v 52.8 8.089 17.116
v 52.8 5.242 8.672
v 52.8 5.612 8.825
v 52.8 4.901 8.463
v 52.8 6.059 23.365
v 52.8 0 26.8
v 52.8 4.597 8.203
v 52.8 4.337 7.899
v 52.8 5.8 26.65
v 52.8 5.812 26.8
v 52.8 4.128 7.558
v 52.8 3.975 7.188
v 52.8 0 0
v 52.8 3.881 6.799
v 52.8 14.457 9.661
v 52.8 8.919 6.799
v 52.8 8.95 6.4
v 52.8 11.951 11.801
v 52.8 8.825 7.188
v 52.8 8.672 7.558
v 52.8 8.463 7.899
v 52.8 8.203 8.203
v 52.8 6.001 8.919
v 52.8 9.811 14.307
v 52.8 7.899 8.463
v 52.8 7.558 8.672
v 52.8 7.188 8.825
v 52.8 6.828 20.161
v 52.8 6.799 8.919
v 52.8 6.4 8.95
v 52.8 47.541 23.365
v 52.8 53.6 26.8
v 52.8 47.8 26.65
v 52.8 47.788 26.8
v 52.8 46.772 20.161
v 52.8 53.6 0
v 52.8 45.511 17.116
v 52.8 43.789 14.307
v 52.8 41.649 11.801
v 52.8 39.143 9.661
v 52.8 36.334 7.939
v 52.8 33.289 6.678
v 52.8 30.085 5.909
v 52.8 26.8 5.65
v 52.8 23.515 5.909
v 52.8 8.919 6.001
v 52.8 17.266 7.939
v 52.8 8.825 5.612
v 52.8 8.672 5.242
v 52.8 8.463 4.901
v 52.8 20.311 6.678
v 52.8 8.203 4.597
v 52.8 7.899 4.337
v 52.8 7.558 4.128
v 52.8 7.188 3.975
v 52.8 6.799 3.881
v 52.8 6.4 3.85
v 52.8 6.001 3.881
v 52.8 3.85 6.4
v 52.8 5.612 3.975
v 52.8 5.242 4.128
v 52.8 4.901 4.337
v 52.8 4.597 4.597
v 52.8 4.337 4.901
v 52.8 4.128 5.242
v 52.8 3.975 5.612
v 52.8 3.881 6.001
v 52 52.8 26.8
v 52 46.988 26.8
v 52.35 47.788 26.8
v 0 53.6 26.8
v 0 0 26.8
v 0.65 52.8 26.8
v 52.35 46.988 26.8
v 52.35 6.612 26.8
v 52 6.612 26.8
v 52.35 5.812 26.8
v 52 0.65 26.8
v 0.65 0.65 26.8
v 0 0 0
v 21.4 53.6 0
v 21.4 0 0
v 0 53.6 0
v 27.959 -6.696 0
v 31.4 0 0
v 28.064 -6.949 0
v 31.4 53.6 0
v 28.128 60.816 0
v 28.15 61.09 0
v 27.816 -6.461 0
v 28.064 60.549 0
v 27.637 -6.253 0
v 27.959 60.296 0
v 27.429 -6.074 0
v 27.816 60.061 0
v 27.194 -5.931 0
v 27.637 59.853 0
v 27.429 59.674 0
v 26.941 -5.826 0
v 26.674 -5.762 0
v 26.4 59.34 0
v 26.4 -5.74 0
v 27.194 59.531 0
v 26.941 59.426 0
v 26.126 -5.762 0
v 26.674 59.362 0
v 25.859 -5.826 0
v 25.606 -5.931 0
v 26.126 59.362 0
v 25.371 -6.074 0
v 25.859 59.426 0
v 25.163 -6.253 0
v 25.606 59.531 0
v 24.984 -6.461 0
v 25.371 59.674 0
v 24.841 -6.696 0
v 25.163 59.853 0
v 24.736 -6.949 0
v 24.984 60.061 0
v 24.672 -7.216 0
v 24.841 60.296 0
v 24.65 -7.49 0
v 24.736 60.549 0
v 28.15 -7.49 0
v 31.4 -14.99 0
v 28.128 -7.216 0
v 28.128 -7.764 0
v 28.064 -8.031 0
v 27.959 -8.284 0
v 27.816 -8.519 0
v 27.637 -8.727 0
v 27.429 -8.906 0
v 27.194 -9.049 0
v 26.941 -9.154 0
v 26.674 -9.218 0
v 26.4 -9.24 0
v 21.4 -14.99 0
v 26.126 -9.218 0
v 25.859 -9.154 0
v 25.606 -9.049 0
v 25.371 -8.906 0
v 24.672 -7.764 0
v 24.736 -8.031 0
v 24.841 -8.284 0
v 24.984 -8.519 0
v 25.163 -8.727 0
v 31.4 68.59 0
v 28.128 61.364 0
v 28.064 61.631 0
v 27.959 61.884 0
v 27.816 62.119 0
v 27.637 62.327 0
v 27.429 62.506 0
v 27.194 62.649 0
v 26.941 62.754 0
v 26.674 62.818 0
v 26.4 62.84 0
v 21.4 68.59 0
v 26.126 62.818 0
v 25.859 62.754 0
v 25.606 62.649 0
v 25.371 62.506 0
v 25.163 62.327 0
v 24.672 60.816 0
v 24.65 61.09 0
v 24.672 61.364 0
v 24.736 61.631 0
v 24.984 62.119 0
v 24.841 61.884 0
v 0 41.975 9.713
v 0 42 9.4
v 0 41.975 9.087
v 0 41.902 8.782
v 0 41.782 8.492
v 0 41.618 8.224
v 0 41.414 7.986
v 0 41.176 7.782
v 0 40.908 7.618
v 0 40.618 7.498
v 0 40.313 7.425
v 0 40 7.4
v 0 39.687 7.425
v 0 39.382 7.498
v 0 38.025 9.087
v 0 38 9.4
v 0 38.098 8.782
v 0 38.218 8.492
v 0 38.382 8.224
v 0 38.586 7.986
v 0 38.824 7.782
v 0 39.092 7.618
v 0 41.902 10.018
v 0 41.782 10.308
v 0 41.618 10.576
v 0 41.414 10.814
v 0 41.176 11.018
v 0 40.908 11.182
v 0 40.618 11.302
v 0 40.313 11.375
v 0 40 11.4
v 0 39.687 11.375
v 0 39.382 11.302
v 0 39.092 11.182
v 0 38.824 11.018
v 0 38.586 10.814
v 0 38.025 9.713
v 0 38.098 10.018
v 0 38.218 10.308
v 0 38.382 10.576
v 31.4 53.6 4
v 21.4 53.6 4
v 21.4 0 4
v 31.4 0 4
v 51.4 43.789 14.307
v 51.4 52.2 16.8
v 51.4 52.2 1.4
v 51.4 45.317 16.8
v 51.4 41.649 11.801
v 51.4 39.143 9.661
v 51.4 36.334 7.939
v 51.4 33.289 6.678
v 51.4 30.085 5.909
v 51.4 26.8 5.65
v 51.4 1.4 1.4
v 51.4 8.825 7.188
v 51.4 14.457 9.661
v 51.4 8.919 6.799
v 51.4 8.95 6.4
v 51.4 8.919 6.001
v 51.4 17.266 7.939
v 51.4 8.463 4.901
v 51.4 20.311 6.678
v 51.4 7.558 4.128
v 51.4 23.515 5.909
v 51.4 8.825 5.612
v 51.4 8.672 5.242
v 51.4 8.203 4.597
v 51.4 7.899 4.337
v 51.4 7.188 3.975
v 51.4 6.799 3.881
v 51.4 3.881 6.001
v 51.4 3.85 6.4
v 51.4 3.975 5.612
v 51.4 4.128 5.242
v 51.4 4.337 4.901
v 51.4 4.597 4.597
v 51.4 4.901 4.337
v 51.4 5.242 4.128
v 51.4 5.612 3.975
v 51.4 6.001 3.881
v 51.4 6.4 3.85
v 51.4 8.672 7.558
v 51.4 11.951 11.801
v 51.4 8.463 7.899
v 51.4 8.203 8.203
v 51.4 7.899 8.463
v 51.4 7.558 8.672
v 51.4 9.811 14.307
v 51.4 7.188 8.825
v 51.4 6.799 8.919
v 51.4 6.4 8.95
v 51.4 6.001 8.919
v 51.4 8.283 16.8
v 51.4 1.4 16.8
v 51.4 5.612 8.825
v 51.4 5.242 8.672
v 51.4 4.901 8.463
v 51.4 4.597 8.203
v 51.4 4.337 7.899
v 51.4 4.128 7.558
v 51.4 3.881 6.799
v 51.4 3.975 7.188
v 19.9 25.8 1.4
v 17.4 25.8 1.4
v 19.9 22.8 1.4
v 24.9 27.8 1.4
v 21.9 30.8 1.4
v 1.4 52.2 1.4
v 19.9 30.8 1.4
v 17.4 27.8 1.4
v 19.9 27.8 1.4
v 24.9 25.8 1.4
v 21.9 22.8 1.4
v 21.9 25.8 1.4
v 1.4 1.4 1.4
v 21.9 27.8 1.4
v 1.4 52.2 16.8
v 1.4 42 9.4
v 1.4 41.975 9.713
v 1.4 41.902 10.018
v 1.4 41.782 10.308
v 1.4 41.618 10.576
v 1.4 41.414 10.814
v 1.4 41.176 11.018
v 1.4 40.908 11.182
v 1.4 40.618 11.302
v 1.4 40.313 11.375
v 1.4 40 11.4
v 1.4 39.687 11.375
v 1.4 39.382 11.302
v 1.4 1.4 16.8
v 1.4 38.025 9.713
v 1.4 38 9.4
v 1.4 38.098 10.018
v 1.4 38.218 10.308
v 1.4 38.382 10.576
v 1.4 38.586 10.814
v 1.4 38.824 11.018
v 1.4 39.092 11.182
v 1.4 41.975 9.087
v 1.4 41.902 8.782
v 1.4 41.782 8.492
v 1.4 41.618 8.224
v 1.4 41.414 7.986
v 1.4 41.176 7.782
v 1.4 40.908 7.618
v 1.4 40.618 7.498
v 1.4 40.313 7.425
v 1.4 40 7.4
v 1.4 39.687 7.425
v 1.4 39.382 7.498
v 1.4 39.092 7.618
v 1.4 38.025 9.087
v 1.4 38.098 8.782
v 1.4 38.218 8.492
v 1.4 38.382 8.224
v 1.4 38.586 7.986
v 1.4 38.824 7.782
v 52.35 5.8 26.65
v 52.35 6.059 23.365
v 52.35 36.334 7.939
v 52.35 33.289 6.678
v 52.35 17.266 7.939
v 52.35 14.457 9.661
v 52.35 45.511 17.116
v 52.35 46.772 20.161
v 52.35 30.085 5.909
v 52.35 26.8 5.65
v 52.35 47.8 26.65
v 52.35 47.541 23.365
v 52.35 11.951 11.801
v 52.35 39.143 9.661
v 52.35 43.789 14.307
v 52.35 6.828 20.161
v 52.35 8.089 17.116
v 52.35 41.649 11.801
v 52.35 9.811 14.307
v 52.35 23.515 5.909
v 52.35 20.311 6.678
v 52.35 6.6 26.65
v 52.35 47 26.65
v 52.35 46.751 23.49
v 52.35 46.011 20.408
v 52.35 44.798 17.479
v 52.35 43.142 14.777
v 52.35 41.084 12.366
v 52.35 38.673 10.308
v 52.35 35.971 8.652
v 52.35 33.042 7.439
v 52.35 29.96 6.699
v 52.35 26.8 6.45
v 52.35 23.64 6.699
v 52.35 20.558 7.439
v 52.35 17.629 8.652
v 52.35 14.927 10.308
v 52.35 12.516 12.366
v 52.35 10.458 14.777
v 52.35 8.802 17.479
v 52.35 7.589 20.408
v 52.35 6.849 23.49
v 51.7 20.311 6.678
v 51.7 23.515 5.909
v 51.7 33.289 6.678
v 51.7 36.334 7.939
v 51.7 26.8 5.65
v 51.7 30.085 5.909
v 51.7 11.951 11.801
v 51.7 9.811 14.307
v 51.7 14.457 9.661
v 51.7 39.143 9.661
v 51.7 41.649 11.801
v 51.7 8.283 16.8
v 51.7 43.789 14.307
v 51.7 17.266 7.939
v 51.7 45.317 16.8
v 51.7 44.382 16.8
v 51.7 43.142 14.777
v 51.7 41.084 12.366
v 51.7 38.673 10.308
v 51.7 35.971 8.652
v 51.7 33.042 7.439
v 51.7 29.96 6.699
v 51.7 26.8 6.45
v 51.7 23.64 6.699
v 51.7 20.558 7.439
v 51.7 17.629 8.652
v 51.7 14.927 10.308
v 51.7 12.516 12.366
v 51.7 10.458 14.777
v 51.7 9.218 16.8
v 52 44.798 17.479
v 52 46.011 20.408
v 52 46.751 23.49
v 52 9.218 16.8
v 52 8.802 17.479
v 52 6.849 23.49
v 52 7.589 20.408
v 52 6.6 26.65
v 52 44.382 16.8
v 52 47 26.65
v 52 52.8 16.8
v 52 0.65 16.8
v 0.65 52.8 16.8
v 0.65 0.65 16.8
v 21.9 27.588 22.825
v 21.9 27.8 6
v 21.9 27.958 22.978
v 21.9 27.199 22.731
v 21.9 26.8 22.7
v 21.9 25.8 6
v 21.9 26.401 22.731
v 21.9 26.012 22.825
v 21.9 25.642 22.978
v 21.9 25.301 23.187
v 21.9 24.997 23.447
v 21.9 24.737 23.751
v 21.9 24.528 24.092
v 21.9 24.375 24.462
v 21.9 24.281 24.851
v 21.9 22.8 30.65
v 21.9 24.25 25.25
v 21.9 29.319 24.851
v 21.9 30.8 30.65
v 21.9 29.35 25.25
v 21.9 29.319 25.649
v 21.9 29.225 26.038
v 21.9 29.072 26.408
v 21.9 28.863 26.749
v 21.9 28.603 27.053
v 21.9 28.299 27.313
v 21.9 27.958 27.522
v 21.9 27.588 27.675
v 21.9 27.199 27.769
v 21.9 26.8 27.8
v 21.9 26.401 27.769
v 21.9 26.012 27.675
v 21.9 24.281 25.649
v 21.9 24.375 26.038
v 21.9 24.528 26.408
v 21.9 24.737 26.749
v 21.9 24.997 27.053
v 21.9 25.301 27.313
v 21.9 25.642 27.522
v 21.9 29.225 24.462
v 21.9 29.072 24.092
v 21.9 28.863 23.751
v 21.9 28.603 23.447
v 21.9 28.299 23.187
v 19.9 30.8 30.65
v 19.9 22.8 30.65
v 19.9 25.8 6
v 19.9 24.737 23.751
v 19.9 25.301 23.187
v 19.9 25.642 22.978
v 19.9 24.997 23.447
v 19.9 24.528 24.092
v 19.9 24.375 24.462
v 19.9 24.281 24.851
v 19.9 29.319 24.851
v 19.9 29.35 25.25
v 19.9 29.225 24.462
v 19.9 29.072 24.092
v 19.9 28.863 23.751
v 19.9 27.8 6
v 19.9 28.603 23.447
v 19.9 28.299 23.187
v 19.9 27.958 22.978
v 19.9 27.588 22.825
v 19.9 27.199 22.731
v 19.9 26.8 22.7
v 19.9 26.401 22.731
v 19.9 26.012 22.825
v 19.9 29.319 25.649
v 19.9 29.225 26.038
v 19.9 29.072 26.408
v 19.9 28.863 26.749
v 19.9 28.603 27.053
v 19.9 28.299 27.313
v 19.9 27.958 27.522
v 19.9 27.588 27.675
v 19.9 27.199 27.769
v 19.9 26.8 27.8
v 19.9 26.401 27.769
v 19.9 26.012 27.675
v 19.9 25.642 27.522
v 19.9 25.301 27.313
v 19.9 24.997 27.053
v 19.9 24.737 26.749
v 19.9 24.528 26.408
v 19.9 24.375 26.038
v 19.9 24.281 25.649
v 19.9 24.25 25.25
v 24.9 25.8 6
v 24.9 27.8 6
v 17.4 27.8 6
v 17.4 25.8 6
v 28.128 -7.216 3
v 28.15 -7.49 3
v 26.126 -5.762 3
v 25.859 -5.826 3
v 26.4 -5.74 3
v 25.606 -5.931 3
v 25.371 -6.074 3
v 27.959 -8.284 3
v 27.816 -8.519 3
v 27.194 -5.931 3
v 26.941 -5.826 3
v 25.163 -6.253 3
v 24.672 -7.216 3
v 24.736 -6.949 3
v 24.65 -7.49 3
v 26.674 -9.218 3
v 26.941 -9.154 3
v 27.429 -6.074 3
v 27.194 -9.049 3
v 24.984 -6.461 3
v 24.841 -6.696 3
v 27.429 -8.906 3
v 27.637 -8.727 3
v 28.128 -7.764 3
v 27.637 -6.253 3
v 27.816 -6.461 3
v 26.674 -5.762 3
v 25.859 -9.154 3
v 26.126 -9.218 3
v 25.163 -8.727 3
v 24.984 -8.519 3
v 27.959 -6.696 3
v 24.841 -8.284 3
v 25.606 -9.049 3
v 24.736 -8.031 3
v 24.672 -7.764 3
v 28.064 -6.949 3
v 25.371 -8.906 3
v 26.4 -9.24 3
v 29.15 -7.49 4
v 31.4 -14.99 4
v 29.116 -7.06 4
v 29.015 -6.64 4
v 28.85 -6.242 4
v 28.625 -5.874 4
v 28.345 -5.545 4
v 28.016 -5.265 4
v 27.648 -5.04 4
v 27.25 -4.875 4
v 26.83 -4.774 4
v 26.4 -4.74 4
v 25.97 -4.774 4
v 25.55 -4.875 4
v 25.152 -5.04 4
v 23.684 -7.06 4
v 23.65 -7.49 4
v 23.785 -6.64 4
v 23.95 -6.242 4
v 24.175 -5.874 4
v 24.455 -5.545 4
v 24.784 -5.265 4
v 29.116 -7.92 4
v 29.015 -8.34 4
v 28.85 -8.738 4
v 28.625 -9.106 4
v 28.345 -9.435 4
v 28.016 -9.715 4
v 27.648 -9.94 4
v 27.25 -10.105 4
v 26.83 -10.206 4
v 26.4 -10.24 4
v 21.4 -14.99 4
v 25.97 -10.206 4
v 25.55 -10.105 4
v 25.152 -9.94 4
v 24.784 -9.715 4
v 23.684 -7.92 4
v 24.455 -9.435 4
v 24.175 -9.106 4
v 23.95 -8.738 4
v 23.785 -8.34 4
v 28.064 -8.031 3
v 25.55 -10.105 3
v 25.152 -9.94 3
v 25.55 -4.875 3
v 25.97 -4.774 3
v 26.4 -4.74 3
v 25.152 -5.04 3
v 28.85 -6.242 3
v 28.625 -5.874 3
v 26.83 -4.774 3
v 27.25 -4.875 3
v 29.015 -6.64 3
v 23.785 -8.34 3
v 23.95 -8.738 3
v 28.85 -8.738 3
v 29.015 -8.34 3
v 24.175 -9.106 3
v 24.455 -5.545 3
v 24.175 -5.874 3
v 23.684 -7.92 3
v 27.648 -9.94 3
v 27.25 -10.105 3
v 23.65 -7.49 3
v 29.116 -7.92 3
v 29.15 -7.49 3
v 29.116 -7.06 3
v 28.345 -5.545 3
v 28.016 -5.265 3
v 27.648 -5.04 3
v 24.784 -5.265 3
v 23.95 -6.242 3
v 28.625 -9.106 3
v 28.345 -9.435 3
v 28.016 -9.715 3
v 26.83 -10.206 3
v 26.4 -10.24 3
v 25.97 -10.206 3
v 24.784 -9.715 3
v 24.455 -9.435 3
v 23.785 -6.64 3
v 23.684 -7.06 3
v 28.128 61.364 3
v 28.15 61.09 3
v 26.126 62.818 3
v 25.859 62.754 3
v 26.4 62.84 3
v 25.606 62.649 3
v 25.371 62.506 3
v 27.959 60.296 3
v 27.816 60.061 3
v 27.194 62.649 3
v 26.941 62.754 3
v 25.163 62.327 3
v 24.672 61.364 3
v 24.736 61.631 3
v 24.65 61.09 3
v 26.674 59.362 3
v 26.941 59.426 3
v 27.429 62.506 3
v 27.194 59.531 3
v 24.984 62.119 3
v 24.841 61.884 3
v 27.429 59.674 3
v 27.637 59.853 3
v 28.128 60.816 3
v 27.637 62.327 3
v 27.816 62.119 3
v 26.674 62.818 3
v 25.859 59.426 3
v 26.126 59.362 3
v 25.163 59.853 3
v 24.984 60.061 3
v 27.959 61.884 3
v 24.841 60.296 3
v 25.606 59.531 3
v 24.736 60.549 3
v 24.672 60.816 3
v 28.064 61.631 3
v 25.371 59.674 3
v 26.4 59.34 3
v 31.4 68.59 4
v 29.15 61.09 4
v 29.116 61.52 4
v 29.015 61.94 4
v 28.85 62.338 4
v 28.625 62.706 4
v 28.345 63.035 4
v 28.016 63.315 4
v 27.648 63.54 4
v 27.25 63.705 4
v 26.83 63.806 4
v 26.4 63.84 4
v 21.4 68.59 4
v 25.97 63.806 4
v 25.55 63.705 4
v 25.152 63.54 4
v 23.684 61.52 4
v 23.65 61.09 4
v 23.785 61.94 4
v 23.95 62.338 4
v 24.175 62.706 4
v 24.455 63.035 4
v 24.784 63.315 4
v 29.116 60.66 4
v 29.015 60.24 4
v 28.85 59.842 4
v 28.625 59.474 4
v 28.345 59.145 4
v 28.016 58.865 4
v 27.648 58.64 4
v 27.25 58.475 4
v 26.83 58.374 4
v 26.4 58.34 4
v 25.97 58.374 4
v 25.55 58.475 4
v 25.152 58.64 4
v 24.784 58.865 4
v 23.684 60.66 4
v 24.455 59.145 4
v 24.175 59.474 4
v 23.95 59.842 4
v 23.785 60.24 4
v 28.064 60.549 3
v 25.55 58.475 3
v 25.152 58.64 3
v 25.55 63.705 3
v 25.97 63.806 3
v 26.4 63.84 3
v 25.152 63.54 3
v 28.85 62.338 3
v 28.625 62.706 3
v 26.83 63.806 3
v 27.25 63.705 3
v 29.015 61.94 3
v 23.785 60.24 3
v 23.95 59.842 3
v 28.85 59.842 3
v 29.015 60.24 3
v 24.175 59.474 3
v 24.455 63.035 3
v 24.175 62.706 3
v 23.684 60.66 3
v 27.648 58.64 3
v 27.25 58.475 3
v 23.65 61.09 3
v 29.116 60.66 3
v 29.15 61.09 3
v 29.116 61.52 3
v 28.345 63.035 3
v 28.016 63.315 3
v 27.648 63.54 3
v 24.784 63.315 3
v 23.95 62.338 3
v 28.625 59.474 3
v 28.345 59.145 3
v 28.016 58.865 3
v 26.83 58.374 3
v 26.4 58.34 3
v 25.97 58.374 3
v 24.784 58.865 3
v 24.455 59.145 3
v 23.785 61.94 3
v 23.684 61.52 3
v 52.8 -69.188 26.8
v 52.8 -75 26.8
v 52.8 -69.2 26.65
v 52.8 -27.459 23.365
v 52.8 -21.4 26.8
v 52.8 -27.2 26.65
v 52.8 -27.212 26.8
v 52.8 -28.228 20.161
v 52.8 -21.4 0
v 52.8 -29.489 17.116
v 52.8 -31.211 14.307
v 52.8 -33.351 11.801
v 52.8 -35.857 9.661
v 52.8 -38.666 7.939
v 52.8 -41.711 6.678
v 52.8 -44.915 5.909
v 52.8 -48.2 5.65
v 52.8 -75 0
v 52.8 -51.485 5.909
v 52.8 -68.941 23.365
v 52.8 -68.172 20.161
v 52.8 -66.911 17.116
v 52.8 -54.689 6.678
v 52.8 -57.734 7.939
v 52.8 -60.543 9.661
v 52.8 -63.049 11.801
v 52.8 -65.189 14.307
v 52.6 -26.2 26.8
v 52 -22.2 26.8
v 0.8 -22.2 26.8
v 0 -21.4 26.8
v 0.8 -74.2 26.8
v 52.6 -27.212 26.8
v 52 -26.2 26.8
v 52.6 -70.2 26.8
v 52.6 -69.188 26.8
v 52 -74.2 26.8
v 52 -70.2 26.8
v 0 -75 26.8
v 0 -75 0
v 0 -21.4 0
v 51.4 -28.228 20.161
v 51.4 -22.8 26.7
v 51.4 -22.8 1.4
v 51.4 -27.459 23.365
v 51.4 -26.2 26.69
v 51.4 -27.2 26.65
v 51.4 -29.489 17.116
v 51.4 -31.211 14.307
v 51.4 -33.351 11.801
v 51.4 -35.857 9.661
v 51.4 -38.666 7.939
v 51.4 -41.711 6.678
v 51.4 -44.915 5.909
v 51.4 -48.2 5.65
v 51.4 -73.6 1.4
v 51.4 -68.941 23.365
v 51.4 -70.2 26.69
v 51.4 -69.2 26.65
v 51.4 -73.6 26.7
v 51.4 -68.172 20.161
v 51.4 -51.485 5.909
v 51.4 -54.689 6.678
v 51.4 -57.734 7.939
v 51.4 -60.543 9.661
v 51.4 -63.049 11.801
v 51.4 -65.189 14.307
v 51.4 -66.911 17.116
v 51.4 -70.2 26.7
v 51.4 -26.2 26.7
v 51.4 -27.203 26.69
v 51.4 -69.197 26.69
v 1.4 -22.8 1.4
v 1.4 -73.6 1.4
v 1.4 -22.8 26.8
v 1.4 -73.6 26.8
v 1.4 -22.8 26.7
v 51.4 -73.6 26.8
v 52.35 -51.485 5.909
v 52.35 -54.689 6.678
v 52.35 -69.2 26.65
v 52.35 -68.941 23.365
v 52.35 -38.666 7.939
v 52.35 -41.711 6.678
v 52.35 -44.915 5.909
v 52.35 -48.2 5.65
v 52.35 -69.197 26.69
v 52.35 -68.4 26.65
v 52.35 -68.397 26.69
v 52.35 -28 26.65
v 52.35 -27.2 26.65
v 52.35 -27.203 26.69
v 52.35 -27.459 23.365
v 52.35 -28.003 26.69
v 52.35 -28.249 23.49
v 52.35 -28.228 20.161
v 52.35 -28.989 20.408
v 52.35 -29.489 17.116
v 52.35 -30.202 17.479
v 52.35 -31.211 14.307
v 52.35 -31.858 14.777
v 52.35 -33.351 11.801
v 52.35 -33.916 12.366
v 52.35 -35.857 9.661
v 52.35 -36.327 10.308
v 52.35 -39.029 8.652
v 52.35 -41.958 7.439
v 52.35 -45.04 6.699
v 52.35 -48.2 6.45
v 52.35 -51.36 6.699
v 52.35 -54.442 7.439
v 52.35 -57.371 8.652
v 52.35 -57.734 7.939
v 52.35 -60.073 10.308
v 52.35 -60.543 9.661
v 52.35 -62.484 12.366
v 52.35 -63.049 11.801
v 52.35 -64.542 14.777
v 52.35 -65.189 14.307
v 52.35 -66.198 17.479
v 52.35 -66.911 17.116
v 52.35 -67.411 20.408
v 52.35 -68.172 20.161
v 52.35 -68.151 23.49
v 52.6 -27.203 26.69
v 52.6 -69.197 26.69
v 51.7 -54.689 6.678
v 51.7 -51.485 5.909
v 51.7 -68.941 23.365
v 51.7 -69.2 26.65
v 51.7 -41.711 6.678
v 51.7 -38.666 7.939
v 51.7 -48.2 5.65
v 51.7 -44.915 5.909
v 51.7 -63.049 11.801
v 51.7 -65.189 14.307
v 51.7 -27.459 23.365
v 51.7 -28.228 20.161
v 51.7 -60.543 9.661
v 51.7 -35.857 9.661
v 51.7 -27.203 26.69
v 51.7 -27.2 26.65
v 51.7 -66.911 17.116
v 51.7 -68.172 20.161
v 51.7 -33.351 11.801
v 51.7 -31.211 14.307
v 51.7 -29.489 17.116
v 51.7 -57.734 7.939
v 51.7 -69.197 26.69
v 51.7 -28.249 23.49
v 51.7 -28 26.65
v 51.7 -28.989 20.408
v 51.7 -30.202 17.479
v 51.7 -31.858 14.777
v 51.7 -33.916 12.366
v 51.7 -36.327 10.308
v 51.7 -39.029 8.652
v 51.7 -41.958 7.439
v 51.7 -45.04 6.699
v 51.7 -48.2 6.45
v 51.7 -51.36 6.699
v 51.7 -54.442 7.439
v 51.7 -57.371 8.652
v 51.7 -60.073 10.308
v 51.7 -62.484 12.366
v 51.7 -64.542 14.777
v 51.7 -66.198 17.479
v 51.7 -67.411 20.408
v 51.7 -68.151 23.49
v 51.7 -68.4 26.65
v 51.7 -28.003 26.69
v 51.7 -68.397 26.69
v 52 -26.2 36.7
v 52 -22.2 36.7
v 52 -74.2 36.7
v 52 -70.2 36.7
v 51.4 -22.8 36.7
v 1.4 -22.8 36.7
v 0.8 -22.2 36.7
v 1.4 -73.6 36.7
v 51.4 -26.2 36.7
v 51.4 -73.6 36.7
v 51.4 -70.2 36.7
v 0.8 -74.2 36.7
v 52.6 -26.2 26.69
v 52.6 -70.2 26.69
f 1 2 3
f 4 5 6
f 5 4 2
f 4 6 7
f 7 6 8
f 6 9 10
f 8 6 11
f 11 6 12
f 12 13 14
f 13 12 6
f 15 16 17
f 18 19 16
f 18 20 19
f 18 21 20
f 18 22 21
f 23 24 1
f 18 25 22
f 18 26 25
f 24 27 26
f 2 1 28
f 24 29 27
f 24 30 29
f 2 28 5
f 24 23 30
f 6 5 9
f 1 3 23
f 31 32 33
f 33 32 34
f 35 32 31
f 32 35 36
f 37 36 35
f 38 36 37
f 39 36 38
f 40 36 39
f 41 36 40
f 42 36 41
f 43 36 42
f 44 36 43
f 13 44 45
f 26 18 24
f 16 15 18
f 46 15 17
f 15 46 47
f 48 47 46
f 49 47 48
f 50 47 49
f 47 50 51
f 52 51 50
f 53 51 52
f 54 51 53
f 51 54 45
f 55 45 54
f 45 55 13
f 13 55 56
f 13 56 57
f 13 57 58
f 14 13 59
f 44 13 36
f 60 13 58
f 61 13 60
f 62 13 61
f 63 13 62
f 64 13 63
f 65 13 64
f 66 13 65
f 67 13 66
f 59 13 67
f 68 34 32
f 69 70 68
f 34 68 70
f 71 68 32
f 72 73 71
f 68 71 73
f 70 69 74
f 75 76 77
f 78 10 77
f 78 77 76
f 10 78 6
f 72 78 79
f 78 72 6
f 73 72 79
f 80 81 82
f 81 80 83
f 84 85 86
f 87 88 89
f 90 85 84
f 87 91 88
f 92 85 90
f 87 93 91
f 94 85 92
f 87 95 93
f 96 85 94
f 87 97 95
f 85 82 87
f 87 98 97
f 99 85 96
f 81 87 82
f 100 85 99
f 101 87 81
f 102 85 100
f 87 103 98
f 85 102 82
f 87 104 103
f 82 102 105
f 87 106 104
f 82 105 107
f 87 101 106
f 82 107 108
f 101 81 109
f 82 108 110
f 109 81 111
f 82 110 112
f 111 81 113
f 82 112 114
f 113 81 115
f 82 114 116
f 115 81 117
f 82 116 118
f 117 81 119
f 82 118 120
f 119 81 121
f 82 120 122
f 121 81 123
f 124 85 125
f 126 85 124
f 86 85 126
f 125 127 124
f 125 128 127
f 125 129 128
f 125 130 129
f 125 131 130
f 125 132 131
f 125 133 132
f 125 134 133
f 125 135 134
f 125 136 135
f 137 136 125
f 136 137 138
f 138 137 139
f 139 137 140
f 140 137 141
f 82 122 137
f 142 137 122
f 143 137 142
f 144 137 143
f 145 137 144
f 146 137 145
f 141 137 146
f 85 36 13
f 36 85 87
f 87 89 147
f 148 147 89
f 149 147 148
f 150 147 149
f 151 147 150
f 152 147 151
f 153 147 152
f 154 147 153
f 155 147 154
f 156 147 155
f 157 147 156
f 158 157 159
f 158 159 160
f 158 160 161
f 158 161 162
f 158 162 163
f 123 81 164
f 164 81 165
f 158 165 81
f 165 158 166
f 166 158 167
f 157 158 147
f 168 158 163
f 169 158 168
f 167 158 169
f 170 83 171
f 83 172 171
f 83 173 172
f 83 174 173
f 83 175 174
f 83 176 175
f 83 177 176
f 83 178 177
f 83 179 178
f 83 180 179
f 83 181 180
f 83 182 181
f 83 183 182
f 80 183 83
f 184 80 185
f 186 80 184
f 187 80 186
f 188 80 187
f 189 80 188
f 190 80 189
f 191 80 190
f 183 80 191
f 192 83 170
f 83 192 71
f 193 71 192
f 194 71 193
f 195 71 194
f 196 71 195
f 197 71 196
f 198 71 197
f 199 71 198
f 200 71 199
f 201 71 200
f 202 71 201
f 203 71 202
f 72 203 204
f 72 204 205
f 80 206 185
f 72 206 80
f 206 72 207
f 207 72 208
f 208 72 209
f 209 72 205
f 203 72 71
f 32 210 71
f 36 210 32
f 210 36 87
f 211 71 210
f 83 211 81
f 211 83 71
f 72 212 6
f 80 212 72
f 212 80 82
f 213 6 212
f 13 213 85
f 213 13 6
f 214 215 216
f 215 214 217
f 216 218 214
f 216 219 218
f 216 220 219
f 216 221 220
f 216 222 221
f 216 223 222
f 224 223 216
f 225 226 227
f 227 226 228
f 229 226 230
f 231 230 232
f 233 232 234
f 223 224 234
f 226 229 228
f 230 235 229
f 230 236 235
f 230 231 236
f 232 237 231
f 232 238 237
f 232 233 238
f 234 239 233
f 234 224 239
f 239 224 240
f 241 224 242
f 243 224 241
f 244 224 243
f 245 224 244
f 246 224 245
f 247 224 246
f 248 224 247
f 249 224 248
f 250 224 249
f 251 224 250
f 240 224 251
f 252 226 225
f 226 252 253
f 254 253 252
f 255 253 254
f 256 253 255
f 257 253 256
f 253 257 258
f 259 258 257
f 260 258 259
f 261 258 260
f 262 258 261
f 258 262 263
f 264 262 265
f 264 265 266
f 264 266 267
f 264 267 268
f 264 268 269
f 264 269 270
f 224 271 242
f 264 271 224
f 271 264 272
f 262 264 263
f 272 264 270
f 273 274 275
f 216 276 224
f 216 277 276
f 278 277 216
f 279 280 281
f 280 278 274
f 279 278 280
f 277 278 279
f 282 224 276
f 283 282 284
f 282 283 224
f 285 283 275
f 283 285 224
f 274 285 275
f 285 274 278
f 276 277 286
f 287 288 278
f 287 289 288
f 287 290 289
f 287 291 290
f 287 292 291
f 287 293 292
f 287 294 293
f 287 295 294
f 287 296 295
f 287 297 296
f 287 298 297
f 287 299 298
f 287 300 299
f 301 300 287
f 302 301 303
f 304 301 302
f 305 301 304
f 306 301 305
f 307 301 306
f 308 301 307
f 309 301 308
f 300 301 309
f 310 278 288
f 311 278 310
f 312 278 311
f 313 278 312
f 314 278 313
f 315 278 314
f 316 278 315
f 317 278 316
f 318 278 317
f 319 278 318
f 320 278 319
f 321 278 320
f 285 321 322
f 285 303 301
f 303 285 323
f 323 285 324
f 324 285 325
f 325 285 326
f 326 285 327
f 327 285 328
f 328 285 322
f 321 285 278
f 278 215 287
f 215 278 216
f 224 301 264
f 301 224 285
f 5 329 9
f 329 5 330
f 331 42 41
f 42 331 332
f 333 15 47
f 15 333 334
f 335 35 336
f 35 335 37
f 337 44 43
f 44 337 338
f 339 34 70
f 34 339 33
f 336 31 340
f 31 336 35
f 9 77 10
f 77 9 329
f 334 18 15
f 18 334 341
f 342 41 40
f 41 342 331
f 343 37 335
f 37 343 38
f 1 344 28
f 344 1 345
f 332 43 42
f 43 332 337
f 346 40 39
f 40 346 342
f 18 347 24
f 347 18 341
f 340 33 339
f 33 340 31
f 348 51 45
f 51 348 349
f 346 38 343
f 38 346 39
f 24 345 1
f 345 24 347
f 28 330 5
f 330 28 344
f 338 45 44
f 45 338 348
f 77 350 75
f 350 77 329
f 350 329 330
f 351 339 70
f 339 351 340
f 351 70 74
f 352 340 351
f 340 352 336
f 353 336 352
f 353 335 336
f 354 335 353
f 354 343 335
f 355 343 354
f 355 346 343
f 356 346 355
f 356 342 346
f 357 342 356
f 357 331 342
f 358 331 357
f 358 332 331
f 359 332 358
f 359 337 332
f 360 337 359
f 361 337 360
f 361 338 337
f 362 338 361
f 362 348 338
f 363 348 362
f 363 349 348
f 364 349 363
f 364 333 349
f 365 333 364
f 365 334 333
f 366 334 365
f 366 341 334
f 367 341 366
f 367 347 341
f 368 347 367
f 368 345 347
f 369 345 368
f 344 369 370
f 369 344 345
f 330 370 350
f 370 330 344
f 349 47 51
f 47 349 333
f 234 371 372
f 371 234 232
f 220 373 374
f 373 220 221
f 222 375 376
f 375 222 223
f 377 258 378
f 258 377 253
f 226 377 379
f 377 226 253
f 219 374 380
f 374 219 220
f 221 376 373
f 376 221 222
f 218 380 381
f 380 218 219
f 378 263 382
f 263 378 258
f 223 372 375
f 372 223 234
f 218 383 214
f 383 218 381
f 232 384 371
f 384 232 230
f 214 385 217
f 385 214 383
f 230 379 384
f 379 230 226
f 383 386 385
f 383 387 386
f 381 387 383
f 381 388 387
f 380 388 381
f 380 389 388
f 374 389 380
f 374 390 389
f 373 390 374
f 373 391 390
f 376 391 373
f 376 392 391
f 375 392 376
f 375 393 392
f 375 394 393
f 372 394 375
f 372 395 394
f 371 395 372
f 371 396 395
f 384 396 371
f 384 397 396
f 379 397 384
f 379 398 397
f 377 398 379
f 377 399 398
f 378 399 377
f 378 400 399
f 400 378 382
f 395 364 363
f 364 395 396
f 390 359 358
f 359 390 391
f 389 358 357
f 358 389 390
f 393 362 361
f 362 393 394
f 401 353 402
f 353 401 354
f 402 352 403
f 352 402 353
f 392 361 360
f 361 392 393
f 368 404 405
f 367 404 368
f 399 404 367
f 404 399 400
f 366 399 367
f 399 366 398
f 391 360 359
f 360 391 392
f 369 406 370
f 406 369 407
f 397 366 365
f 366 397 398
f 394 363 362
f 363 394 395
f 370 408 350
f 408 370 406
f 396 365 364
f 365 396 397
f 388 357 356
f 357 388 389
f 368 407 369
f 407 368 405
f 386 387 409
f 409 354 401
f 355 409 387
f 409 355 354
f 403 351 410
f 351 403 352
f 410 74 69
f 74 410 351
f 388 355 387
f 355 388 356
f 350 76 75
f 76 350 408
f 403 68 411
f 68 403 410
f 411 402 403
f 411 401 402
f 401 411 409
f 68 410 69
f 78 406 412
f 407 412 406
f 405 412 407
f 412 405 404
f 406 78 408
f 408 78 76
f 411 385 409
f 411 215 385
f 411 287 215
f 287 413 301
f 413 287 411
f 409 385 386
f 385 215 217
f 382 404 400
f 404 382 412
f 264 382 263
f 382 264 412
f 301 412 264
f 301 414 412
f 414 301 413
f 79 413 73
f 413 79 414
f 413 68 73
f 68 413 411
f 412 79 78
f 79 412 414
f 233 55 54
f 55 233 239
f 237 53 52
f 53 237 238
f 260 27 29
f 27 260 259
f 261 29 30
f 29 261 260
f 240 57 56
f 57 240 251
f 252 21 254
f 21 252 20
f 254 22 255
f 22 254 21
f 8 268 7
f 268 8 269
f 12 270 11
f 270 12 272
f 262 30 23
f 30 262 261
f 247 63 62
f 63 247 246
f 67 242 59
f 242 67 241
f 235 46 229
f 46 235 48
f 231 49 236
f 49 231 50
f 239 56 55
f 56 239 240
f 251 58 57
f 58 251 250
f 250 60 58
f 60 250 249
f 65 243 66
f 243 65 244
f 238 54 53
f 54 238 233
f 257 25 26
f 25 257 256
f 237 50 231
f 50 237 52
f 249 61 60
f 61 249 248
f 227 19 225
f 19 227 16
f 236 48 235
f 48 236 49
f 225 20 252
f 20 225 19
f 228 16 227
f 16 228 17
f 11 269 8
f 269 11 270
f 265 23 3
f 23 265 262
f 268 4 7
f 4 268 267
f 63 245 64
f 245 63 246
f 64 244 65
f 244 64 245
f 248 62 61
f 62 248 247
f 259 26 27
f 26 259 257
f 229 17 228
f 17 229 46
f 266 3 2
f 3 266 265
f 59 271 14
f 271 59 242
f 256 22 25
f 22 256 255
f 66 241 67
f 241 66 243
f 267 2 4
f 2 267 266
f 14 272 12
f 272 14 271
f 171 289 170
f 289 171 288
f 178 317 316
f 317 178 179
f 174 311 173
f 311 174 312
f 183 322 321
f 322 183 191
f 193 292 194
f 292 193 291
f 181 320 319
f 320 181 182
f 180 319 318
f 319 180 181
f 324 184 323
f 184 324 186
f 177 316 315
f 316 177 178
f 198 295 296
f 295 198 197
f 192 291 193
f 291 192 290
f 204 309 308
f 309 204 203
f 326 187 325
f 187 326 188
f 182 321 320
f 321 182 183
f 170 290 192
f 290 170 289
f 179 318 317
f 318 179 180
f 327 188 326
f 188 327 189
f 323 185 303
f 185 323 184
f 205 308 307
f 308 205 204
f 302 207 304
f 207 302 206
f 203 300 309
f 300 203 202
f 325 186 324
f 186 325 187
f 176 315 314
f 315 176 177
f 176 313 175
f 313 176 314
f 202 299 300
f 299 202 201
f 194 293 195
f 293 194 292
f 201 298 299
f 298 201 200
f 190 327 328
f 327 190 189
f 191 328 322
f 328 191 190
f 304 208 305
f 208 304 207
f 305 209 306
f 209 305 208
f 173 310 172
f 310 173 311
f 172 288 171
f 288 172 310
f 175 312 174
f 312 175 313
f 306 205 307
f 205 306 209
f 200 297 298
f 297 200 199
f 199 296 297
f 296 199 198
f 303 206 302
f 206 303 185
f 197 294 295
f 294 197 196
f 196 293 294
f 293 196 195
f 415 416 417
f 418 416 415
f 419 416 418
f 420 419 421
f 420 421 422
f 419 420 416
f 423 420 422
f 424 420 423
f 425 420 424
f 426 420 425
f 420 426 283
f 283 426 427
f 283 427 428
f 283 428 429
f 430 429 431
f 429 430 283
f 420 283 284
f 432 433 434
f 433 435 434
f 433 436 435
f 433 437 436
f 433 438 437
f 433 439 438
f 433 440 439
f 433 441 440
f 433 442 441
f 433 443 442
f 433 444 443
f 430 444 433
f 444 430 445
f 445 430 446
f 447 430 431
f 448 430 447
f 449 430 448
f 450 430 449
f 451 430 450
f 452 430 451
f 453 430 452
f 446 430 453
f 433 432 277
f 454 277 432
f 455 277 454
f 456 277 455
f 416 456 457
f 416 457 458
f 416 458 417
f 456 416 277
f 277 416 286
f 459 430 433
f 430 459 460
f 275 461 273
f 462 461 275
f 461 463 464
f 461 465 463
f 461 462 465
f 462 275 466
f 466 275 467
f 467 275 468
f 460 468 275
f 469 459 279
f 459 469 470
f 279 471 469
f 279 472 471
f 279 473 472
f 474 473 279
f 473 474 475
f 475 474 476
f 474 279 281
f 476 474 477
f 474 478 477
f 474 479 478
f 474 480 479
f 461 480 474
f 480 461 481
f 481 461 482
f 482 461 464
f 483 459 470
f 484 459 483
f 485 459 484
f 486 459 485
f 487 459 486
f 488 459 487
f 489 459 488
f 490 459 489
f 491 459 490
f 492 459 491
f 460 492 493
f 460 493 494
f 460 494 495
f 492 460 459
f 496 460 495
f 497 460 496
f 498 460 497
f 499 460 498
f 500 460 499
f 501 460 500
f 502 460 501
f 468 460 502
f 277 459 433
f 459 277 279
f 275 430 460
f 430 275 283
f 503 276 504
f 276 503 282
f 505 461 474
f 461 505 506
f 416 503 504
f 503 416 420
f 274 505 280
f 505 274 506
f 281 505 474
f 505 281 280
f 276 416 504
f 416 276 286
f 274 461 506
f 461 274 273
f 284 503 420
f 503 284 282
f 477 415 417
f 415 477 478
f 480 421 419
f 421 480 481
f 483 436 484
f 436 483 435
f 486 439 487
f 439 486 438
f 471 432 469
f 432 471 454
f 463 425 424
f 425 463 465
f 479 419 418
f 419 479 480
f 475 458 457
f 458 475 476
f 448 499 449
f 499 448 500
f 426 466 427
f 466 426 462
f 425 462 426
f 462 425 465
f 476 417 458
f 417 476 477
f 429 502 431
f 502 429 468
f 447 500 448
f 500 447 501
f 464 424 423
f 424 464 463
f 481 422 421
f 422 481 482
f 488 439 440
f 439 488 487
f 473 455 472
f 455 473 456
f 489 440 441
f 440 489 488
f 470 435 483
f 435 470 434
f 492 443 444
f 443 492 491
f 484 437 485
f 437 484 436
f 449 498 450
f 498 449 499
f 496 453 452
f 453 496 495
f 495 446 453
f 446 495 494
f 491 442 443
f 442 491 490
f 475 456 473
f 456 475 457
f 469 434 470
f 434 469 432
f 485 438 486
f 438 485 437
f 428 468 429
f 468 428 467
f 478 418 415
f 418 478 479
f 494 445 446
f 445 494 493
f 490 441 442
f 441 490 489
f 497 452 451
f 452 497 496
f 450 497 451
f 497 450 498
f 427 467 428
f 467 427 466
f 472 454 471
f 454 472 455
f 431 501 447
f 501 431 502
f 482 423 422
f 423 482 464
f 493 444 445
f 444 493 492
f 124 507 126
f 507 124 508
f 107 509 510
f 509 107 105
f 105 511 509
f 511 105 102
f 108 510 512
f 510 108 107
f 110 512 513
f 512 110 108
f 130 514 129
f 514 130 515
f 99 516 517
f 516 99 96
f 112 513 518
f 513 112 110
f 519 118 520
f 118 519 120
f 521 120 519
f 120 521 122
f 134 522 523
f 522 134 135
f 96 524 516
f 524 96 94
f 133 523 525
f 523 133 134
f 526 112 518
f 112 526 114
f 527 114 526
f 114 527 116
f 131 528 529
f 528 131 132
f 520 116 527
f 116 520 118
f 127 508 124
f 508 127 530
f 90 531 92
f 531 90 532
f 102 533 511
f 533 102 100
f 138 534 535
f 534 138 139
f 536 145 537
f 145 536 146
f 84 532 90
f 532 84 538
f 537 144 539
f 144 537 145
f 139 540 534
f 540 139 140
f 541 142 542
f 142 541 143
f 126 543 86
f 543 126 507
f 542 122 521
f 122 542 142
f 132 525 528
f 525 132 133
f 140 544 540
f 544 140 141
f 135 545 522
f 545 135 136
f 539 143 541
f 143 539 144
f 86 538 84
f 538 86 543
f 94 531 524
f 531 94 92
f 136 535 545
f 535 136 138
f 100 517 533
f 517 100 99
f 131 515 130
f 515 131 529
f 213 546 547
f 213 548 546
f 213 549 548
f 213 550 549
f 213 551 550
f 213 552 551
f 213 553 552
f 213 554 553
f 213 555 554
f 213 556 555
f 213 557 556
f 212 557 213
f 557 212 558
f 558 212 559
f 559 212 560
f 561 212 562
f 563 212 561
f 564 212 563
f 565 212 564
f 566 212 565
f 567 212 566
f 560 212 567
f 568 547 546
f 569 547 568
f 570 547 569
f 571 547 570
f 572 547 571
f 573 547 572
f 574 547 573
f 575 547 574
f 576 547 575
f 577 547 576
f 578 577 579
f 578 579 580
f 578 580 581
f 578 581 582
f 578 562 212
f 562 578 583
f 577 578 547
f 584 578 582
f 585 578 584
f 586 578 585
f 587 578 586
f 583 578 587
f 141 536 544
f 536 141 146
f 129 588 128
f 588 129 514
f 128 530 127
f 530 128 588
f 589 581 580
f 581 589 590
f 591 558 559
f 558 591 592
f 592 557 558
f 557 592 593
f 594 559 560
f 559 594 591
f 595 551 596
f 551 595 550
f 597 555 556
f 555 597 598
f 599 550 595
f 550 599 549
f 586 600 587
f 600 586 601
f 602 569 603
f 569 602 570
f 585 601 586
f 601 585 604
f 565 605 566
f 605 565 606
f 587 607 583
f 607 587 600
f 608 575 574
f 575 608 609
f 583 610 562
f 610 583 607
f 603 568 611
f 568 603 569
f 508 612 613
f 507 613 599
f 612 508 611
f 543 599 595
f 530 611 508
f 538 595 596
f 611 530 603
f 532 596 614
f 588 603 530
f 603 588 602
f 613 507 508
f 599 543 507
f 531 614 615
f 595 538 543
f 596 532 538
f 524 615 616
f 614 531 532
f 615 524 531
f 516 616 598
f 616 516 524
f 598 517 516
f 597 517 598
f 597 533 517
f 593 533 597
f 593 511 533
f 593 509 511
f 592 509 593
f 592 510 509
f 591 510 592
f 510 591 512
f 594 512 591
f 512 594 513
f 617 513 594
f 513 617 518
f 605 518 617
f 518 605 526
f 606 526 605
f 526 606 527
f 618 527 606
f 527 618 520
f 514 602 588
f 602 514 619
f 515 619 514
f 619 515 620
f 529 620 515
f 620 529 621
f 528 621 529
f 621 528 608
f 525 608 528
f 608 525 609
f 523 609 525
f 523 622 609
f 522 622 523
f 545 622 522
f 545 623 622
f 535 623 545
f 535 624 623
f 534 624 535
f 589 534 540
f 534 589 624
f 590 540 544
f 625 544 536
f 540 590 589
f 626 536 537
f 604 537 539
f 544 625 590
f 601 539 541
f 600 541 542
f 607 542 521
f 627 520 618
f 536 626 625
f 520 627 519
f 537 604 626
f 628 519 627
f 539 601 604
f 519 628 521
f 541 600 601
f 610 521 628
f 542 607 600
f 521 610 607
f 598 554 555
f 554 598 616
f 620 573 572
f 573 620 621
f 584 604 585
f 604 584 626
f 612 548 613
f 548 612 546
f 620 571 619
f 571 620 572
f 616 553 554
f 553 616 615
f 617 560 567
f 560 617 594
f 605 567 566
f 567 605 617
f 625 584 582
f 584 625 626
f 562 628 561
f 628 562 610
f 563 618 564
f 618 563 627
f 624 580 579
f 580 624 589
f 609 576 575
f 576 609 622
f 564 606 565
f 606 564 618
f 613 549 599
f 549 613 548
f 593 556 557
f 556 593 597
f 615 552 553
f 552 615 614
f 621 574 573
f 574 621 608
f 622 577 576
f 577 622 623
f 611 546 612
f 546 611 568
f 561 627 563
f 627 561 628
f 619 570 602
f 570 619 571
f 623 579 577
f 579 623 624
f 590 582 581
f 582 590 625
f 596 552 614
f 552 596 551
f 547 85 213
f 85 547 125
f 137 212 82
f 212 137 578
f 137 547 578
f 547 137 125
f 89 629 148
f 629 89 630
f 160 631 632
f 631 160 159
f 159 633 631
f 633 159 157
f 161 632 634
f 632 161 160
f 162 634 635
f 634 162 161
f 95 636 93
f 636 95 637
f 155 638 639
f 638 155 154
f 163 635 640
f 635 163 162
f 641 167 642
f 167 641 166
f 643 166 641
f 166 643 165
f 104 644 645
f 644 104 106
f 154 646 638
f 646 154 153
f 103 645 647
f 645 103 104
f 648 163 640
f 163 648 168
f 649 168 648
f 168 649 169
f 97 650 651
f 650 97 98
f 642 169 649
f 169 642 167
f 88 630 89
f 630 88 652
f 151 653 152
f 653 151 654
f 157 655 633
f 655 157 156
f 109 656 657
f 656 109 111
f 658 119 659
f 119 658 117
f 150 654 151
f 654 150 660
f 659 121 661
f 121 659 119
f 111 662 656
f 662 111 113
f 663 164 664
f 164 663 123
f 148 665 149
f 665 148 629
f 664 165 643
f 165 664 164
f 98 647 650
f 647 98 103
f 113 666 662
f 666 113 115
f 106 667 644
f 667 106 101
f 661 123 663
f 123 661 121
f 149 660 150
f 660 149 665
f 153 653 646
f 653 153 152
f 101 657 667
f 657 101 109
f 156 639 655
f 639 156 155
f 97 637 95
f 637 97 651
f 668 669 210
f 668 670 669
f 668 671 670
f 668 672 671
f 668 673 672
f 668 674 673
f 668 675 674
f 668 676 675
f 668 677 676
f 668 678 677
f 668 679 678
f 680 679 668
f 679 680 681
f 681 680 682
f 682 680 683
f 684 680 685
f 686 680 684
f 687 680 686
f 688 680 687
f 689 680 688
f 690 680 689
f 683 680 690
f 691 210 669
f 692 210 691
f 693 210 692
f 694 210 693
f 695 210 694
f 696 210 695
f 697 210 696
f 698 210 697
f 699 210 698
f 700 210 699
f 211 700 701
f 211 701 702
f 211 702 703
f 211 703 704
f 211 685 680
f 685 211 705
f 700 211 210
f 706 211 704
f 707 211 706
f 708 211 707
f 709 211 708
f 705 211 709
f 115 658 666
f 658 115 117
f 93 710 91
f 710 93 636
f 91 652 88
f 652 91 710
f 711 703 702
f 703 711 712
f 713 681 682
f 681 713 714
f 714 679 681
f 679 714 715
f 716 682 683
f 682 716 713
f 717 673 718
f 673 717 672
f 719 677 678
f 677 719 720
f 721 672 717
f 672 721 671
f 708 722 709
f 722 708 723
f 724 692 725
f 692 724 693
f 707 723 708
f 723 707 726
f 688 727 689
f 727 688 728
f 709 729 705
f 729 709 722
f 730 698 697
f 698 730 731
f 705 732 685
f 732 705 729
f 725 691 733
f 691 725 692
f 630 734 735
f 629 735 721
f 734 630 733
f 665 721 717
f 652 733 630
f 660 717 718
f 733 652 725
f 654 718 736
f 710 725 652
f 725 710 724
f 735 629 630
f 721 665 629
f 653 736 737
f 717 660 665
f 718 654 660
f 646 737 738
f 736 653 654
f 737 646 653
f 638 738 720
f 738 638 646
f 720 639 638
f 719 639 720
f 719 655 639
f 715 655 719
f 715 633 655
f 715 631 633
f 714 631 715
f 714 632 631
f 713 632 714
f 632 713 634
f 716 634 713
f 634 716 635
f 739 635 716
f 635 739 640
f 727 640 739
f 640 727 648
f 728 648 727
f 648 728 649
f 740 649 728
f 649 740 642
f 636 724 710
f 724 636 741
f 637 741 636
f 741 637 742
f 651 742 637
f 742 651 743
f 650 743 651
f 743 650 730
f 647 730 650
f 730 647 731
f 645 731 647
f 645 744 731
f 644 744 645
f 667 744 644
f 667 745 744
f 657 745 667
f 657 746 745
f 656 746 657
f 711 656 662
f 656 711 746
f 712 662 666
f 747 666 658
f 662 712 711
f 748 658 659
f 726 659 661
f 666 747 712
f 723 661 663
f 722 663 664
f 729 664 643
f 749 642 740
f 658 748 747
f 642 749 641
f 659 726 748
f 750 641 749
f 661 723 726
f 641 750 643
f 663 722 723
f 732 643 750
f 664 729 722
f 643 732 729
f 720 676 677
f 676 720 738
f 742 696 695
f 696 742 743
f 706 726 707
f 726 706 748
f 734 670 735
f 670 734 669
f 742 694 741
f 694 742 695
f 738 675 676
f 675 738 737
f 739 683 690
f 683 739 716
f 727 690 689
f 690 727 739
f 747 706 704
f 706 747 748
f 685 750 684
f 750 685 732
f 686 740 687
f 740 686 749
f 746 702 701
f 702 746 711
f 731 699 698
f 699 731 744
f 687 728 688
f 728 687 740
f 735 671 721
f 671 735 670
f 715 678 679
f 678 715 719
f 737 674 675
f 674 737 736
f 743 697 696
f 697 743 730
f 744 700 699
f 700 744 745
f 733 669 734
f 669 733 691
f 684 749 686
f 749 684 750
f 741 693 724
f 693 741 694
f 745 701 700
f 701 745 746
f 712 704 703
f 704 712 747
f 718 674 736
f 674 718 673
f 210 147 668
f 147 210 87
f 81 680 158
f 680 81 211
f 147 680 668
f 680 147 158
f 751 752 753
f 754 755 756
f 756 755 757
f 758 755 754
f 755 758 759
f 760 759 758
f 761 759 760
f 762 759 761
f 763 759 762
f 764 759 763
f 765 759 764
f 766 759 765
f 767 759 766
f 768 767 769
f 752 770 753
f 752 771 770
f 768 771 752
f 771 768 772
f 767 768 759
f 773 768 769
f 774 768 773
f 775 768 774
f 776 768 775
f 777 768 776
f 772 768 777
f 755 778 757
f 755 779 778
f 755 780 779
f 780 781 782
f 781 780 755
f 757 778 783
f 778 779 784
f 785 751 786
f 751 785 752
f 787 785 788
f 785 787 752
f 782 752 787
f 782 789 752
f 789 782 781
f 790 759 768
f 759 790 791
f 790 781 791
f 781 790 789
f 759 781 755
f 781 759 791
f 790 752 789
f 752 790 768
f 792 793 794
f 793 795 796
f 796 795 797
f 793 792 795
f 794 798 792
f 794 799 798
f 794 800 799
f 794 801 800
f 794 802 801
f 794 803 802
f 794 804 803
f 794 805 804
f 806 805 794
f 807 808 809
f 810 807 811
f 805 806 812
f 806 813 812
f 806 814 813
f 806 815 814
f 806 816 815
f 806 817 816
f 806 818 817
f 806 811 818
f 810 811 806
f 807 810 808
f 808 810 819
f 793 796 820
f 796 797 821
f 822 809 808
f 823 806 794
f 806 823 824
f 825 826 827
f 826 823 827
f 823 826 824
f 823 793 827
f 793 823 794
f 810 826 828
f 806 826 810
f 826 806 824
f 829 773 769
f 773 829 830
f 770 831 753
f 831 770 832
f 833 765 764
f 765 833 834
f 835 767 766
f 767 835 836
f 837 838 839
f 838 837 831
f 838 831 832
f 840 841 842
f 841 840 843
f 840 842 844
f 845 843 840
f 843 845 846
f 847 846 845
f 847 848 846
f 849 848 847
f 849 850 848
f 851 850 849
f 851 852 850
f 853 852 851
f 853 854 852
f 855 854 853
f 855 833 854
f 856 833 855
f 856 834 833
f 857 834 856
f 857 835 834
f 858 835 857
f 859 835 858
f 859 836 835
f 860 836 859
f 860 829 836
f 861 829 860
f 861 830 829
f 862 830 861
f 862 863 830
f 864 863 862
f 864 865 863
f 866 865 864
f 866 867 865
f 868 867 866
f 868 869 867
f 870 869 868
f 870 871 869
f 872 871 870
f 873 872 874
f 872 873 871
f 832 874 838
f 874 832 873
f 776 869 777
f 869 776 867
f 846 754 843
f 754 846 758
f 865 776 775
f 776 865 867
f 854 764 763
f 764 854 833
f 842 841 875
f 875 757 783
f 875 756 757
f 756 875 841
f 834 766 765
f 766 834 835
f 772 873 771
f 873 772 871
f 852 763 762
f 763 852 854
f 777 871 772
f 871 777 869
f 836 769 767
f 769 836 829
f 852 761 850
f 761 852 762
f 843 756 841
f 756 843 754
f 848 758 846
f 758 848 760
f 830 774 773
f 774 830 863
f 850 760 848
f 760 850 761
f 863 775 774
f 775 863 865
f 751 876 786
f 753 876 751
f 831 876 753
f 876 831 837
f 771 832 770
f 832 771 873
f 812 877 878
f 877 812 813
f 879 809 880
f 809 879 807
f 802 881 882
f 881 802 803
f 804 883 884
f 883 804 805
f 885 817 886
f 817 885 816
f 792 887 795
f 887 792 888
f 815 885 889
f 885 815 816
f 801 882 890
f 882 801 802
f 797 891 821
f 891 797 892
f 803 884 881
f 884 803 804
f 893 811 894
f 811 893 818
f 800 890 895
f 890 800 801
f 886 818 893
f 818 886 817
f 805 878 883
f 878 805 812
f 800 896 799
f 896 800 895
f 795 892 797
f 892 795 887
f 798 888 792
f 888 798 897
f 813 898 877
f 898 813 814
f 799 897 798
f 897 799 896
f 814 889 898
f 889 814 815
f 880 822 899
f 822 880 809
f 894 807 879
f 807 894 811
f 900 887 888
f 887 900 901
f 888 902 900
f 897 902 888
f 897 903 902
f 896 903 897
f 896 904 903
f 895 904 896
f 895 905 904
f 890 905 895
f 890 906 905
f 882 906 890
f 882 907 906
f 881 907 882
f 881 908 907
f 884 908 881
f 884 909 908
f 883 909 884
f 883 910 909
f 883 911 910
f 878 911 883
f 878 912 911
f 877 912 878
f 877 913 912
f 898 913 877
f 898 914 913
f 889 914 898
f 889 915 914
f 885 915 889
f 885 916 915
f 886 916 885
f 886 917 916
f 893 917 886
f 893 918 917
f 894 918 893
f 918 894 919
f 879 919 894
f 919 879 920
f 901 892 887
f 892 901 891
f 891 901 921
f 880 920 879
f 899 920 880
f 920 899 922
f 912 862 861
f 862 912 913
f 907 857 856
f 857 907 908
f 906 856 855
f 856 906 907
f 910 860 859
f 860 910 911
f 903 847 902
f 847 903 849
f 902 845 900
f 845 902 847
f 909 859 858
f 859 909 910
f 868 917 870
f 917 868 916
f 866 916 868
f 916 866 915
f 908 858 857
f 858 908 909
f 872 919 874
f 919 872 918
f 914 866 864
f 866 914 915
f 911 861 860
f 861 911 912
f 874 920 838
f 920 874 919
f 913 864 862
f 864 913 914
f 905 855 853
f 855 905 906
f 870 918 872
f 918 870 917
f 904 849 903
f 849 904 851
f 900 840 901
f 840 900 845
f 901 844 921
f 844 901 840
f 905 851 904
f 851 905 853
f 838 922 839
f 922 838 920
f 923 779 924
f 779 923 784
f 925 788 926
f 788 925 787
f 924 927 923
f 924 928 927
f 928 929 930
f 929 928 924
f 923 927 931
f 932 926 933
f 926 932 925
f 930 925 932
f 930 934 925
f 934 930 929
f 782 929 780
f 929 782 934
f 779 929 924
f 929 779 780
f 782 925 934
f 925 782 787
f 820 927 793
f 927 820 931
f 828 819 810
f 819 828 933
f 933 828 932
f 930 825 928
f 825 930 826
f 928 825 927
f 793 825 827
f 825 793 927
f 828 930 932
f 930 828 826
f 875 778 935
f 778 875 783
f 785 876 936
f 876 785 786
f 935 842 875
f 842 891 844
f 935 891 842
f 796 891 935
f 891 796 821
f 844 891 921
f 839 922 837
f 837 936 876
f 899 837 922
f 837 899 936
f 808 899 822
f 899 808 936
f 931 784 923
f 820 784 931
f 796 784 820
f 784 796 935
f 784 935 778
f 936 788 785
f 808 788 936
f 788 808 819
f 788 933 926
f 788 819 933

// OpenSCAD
magnifier_d = [50.5, 40];
magnifier_f = 29.5;
magnifier_ring = 0.5;

photodiode_d = 5.1;
control_diode_d = 5.1;

connector_hole_dia = 4;

screwholder_size = [10, 15, 4];
screw_hole_dia = 3.5;

fatness = 1.4;
inset = .3;

round_prec = 40;

inner_box = [50, magnifier_d[0] + inset, magnifier_d[0] + inset];
box = [inner_box.x + 2 * fatness, inner_box.y + 2 * fatness, inner_box.z + 2 * fatness];


echo("Box size ", box.x, " x ", box.y, " x ", box.z);
echo("Inner box size ", inner_box.x, " x ", inner_box.y, " x ", inner_box.z);

// ---------------------------------------------

module ScrewHolder(x, y) {
    translate([x, y - screwholder_size.y / 2]) difference() {
        cube([screwholder_size.x, screwholder_size.y, screwholder_size.z]);
        translate([screwholder_size.x / 2, screwholder_size.y / 2]) rotate([0, 0, 90]) {
            cylinder(h = screwholder_size.z, d = screw_hole_dia, $fn = round_prec);
            translate([0, 0, screwholder_size.z - 1]) color("yellow") cylinder(h = 1, d = screw_hole_dia + 2, $fn = round_prec);
        }
    }
}

// magnifier holder
union() {
    difference() {
        cube([box.x, box.y, box.z / 2]);
        translate([fatness, fatness, fatness]) {
            cube([inner_box.x, inner_box.y, inner_box.z]);
        }

        h = (fatness - magnifier_ring) / 2;
        center_z = magnifier_d[0] / 2 + fatness;
        dia = magnifier_d[1] + 2;

        translate([box.x - h, box.y / 2, center_z]) rotate([0, 90]) {
            color("red") cylinder(h = 1, d = dia, $fn = round_prec);
        }
        translate([box.x - fatness - inset / 2 - 1, box.y / 2, center_z]) rotate([0, 90]) {
            color("red") cylinder(h = 1 + h, d = dia, $fn = round_prec);
        }
        translate([box.x - fatness, box.y / 2, center_z]) rotate([0, 90]) {
            color("blue") cylinder(h = fatness, d = dia - 1.6, $fn = round_prec);
        }

        color("green") translate([fatness / 2 - .05, fatness / 2 - .05, box.z / 2 - 10]) {
            size = [box.x - fatness - .05, box.y - fatness - .05, 10];
            echo("Closing inner", size.x, "x", size.y);
            cube(size);
        }

        // hole for control LED
        translate([box.x - fatness - .01, fatness + 5, fatness + 5]) rotate([0, 90]) {
            cylinder(h = fatness + .02, d = control_diode_d, $fn = round_prec);
        }

        // hole for wire
        translate([- .01, 40, fatness + 8]) rotate([0, 90]) {
            cylinder(h = fatness + .02, d = connector_hole_dia, $fn = round_prec);
        }
    }

    led_column_width = 8;

    // actual diode holder
    translate([box.x - fatness - magnifier_f - 2, box.y / 2 - led_column_width / 2, 0]) {
        color("yellow")
            difference() {
                union() {
                    cube([2, led_column_width, magnifier_d[0] / 2 + 4 + fatness]);
                    translate([- 2.5, led_column_width / 2 - 1]) cube([7.5, 2, 6]);
                }
                translate([- .1, led_column_width / 2, magnifier_d[0] / 2]) rotate([0, 90]) {
                    color("red") cylinder(h = 2 + 0.2, d = photodiode_d, $fn = round_prec);
                }
            }
    }

    ScrewHolder(box.x / 2 - screwholder_size.x / 2, - screwholder_size.y / 2 + .01);
    ScrewHolder(box.x / 2 - screwholder_size.x / 2, box.y + screwholder_size.y / 2 - .01);
}


// cover
translate([0, - 75, 0])
    difference() {
        union() {
            difference() {
                cube([box.x, box.y, box.z / 2]);
                translate([fatness, fatness, fatness]) {
                    cube([inner_box.x, inner_box.y, inner_box.z]);
                }

                h = (fatness - magnifier_ring) / 2;
                center_z = magnifier_d[0] / 2 + fatness;
                dia = magnifier_d[1] + 2;

                translate([box.x - h, box.y / 2, center_z]) rotate([0, 90]) {
                    color("red") cylinder(h = 1, d = dia, $fn = round_prec);
                }
                translate([box.x - fatness - inset / 2 - 1, box.y / 2, center_z]) rotate([0, 90]) {
                    color("red") cylinder(h = 1 + h, d = dia, $fn = round_prec);
                }
                translate([box.x - fatness, box.y / 2, center_z]) rotate([0, 90]) {
                    color("blue") cylinder(h = fatness, d = dia - 1.6, $fn = round_prec);
                }
            }

            color("green") translate([fatness / 2 + .1, fatness / 2 + .1, box.z / 2 - .1]) {
                difference() {
                    size = [box.x - fatness - .2, box.y - fatness - .2, 10];
                    echo("Closing outer", size.x, "x", size.y);
                    cube(size);
                    translate([fatness / 2 - .1, fatness / 2 - .1, - .1]) {
                        cube([inner_box.x, inner_box.y, inner_box.z]);
                    }
                }
            }
        }

        // cut the hole for magnifier
        color("red") translate([box.x - fatness - .2, box.y / 2 - magnifier_d[1] / 2 - 2, box.z / 2 - .11]) {
            cube([fatness, magnifier_d[1] + 4, 10 + .1]);
        }
    }
